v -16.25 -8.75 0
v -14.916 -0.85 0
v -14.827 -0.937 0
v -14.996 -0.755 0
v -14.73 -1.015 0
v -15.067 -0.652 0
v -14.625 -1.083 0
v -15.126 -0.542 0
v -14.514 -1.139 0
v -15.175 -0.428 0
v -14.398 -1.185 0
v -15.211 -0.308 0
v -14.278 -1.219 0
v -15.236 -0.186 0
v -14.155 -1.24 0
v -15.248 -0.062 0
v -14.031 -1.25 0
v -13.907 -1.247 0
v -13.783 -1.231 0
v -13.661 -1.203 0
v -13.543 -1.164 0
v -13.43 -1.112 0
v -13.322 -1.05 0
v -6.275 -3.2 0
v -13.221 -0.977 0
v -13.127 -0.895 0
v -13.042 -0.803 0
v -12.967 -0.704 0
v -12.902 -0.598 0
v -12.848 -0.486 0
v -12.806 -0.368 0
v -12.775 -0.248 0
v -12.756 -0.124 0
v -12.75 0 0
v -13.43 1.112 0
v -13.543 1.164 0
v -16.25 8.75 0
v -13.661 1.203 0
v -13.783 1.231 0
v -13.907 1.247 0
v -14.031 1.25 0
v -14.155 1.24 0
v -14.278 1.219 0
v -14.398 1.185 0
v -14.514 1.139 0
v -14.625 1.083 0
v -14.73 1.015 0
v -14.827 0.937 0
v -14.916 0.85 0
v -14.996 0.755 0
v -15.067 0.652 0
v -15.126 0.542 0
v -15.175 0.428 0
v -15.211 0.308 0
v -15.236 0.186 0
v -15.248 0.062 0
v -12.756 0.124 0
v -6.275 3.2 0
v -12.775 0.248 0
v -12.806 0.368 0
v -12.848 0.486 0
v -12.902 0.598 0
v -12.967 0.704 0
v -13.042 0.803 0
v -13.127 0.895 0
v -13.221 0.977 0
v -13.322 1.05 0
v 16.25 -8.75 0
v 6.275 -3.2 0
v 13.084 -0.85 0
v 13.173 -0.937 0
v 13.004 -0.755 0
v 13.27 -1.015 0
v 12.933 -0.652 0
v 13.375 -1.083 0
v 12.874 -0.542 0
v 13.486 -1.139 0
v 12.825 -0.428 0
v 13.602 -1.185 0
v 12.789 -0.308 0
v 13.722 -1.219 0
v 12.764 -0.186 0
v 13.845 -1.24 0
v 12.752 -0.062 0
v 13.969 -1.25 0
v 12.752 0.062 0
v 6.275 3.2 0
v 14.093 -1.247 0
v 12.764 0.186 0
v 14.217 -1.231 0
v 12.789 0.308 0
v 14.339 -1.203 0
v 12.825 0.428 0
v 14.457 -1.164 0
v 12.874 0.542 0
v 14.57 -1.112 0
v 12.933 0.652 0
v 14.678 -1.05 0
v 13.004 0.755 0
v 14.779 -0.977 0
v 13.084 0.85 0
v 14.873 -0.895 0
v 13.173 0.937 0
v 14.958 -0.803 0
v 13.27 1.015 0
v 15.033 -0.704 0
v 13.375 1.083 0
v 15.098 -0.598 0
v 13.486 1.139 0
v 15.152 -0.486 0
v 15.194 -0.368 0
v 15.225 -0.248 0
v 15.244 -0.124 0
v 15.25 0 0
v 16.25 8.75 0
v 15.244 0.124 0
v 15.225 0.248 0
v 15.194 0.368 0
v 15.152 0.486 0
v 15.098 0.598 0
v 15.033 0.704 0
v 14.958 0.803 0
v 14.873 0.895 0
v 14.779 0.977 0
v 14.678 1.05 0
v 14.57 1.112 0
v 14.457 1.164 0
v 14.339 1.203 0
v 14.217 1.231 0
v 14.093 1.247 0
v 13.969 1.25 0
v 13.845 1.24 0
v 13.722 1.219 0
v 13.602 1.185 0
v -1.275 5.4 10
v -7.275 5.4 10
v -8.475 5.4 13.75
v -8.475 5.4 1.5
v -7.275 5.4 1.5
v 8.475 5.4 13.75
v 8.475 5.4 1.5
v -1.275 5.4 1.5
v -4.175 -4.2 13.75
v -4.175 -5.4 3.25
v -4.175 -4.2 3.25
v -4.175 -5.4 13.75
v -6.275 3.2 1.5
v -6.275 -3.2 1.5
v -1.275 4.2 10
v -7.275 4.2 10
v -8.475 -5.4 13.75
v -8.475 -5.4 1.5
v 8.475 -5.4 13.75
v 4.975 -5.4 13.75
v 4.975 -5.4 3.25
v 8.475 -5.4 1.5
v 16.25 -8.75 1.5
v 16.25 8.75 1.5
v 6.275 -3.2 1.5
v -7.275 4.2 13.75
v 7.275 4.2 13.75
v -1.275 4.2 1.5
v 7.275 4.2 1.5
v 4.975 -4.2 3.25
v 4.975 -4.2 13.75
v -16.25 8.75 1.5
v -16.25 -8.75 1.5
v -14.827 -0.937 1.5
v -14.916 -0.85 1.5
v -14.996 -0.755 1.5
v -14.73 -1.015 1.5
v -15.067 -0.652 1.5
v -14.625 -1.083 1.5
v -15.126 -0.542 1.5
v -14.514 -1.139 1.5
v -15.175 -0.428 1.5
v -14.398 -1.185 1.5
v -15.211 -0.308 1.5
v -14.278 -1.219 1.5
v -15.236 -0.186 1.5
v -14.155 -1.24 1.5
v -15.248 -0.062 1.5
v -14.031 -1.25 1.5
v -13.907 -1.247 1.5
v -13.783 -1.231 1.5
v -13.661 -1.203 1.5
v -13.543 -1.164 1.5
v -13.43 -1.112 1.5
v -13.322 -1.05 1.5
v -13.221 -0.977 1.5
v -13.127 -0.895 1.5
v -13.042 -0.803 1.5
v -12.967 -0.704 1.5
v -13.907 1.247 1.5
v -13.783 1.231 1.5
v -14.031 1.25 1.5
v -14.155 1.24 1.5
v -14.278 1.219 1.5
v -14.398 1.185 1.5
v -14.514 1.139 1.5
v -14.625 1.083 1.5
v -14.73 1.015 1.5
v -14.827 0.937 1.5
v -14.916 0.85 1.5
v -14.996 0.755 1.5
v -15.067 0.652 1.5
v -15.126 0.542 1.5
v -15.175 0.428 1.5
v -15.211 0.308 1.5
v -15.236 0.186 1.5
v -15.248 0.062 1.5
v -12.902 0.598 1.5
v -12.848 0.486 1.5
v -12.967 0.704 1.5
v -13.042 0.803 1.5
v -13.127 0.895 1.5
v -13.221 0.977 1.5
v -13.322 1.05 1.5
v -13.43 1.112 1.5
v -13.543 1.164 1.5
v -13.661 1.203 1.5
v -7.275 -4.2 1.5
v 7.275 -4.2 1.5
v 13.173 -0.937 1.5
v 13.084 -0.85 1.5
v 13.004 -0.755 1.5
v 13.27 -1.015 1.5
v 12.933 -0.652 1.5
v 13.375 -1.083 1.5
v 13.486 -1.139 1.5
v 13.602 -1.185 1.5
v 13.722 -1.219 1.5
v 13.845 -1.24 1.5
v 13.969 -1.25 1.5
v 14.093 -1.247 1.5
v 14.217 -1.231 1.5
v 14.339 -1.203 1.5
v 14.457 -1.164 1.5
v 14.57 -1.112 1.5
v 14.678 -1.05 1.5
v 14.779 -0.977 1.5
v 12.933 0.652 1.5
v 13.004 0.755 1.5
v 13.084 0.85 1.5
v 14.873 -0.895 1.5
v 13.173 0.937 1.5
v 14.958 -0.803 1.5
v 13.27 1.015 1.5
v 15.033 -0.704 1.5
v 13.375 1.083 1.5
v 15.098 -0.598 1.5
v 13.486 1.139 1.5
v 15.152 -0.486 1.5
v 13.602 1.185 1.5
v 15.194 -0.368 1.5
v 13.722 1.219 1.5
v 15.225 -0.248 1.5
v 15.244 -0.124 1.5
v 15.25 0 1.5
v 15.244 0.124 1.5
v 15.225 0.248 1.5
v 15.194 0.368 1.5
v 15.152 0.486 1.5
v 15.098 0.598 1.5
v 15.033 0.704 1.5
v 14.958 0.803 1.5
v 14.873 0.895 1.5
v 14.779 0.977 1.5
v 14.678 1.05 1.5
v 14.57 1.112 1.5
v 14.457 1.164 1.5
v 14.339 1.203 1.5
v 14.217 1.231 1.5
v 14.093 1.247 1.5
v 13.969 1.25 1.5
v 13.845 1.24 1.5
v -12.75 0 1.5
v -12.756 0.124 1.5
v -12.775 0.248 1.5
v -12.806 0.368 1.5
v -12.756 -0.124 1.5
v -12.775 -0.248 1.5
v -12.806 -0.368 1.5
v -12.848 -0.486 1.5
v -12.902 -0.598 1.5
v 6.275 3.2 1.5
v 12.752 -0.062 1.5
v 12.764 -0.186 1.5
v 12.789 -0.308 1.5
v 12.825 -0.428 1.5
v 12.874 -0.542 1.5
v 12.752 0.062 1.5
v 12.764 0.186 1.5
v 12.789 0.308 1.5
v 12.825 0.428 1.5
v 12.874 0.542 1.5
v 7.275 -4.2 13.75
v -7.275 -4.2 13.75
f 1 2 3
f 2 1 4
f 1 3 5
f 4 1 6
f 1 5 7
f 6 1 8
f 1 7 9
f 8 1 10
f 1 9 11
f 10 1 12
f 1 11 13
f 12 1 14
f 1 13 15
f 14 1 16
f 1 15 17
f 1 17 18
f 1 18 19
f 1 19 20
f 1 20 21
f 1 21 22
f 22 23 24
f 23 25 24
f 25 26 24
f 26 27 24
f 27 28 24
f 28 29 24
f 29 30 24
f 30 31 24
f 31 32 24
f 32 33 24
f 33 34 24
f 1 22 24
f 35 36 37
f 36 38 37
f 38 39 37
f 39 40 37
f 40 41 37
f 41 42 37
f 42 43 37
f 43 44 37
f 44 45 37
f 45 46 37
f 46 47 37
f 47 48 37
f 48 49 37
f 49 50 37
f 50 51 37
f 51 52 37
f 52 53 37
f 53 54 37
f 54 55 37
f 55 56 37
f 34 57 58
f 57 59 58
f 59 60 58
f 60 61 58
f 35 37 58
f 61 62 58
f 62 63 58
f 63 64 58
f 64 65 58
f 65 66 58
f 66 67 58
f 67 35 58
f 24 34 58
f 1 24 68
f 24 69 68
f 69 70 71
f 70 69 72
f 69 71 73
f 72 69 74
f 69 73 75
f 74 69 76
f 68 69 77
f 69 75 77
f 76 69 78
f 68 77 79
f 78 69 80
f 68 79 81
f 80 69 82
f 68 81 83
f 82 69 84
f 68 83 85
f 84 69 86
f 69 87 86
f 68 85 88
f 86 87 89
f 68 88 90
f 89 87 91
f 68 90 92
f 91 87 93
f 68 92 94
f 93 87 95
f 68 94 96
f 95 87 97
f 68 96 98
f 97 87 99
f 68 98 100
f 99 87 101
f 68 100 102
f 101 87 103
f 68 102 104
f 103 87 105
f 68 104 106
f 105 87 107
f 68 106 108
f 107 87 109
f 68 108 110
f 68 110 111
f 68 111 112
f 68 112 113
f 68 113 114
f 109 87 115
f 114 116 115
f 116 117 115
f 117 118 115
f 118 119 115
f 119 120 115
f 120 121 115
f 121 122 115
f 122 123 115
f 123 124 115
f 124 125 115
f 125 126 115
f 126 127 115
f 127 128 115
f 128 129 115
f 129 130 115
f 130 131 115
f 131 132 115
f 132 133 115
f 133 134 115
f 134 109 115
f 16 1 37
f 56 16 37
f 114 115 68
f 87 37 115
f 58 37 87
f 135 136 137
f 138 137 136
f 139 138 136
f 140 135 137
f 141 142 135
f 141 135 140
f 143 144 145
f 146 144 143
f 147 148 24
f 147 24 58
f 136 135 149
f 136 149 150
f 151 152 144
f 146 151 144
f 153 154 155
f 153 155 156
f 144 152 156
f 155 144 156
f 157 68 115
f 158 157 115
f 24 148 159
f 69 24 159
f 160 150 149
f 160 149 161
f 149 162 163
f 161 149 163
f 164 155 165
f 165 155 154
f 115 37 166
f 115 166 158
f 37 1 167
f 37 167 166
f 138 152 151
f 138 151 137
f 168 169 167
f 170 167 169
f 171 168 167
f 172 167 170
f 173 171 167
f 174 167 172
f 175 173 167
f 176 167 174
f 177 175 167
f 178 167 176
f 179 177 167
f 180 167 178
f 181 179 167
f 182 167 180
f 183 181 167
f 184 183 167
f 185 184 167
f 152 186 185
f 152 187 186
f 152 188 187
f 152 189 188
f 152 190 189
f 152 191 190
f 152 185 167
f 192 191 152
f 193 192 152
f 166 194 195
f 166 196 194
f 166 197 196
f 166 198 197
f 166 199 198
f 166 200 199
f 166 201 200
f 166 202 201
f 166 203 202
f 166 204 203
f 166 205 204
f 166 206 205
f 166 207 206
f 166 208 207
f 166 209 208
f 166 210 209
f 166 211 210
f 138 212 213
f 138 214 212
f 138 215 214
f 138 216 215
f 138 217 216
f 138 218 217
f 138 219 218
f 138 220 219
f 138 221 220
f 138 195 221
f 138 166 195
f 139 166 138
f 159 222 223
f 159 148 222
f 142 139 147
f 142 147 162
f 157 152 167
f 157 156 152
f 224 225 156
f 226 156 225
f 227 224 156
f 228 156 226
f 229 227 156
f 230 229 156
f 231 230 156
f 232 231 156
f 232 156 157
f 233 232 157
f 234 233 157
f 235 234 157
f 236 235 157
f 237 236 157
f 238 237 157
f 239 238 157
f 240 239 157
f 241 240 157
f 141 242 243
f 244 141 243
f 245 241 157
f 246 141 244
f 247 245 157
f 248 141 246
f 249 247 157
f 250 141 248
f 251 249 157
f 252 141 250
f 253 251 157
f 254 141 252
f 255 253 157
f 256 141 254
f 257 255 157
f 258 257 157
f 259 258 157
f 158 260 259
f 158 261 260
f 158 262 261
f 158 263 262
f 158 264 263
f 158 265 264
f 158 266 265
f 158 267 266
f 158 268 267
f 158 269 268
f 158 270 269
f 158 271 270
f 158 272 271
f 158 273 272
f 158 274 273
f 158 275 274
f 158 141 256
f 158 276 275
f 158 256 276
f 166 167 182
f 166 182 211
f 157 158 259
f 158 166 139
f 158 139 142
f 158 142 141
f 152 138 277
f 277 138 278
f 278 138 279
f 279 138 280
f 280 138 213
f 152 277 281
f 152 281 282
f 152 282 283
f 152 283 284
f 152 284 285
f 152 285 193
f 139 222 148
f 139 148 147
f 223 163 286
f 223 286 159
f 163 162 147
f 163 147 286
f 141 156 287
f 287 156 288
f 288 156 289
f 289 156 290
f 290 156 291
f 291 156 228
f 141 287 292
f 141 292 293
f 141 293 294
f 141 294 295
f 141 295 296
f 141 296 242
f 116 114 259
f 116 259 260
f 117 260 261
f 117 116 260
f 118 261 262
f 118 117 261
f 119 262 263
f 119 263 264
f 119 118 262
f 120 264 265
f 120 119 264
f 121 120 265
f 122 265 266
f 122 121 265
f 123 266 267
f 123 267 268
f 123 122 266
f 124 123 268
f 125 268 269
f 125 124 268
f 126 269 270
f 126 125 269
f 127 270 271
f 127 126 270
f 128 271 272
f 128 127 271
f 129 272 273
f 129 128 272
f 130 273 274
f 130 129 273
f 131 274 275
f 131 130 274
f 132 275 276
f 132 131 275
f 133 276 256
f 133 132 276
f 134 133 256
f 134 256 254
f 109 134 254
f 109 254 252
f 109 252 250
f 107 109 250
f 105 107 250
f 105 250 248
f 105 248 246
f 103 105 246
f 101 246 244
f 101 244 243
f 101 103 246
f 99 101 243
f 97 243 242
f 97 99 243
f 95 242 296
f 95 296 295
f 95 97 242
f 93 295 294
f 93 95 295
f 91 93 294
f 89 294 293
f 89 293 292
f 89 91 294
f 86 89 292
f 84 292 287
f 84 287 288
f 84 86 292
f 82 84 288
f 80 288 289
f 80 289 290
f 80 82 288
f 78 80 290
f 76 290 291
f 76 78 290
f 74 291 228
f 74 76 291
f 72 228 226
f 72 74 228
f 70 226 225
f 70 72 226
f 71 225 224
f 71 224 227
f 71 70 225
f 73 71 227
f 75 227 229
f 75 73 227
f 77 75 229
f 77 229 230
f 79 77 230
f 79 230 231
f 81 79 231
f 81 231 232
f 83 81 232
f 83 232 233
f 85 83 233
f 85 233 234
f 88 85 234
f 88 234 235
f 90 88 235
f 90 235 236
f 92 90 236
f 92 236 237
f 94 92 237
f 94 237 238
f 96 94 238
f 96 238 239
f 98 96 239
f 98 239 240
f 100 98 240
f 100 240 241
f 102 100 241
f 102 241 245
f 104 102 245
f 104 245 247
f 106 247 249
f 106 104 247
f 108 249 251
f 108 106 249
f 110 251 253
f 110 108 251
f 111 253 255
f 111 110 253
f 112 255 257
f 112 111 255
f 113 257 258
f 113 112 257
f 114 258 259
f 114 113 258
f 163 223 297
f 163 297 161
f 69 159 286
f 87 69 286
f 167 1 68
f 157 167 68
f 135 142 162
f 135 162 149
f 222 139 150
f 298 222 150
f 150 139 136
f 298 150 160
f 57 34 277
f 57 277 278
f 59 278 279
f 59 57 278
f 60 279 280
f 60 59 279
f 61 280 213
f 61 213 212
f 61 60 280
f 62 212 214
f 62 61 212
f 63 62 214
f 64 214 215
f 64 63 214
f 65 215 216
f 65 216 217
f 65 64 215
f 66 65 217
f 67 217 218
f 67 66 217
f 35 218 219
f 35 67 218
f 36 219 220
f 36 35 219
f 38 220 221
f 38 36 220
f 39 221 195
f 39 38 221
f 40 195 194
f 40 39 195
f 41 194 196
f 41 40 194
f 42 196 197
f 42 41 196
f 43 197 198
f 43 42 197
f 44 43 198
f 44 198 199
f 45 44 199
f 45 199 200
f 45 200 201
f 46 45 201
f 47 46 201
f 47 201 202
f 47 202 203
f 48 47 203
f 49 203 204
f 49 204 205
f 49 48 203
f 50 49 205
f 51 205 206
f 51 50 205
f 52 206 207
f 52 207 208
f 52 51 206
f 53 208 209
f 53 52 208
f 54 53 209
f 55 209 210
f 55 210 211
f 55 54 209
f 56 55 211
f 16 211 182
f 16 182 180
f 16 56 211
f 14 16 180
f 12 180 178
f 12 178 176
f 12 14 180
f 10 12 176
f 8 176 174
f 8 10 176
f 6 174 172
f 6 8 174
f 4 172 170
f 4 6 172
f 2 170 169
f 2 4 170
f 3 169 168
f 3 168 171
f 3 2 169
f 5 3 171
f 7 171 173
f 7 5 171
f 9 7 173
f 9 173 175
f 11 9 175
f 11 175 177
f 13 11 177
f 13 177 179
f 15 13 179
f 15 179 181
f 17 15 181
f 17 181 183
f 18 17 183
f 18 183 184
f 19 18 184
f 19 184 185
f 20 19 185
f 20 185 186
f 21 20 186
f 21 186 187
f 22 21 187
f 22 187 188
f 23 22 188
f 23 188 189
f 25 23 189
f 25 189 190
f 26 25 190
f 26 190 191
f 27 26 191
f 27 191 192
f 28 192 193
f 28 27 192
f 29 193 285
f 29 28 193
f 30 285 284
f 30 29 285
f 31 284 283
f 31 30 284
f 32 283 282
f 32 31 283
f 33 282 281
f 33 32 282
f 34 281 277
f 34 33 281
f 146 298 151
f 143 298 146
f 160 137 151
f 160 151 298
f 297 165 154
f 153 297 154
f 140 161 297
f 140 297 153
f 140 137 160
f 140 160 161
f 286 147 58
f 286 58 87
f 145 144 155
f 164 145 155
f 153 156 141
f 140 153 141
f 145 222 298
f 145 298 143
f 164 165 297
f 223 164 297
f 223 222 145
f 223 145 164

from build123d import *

# Parameters (mm, degrees)
F0_W     = 32.5
F0_H     = 17.5
F0_R     = 1.25
F1_DEPTH = 1.5
F2_W     = 16.95
F2_H     = 10.8
F2_W_2   = 14.55
F2_H_2   = 8.4
F3_DEPTH = 12.25
F4_W     = 9.15
F4_H     = 10.5
F5_DEPTH = 1.2
F6_W     = 6
F6_H     = 8.5
F7_DEPTH = 1.2
F8_W     = 12.55
F8_H     = 6.4
F9_DEPTH = 25


with BuildPart() as f1:
    # F0 (on Top) → F1 (new body)
    with BuildSketch(Plane.XY):
        Rectangle(F0_W, F0_H)
        with Locations((-14, 0)):
            Circle(F0_R, mode=Mode.SUBTRACT)
        with Locations((14, 0)):
            Circle(F0_R, mode=Mode.SUBTRACT)
    extrude(amount=F1_DEPTH)

    # F2 (on face) → F3 (join)
    with BuildSketch(Plane.XY.offset(1.5)):
        Rectangle(F2_W, F2_H)
        Rectangle(F2_W_2, F2_H_2, mode=Mode.SUBTRACT)
    extrude(amount=F3_DEPTH)

    # F4 (on face) → F5 (cut, through all)
    with BuildSketch(Plane.XZ.offset(5.4)):
        with Locations((0.4, 8.5)):
            Rectangle(F4_W, F4_H)
    extrude(amount=-F5_DEPTH, mode=Mode.SUBTRACT)

    # F6 (on face) → F7 (cut, through all)
    with BuildSketch(Plane(origin=(0, 5.4, 0), x_dir=(-1, 0, 0), z_dir=(0, 1, 0))):
        with Locations((4.275, 5.75)):
            Rectangle(F6_W, F6_H)
    extrude(amount=-F7_DEPTH, mode=Mode.SUBTRACT)

    # F8 (on face) → F9 (cut)
    with BuildSketch(Plane.XY.offset(1.5)):
        Rectangle(F8_W, F8_H)
    extrude(amount=-F9_DEPTH, mode=Mode.SUBTRACT)


solid = f1.part
